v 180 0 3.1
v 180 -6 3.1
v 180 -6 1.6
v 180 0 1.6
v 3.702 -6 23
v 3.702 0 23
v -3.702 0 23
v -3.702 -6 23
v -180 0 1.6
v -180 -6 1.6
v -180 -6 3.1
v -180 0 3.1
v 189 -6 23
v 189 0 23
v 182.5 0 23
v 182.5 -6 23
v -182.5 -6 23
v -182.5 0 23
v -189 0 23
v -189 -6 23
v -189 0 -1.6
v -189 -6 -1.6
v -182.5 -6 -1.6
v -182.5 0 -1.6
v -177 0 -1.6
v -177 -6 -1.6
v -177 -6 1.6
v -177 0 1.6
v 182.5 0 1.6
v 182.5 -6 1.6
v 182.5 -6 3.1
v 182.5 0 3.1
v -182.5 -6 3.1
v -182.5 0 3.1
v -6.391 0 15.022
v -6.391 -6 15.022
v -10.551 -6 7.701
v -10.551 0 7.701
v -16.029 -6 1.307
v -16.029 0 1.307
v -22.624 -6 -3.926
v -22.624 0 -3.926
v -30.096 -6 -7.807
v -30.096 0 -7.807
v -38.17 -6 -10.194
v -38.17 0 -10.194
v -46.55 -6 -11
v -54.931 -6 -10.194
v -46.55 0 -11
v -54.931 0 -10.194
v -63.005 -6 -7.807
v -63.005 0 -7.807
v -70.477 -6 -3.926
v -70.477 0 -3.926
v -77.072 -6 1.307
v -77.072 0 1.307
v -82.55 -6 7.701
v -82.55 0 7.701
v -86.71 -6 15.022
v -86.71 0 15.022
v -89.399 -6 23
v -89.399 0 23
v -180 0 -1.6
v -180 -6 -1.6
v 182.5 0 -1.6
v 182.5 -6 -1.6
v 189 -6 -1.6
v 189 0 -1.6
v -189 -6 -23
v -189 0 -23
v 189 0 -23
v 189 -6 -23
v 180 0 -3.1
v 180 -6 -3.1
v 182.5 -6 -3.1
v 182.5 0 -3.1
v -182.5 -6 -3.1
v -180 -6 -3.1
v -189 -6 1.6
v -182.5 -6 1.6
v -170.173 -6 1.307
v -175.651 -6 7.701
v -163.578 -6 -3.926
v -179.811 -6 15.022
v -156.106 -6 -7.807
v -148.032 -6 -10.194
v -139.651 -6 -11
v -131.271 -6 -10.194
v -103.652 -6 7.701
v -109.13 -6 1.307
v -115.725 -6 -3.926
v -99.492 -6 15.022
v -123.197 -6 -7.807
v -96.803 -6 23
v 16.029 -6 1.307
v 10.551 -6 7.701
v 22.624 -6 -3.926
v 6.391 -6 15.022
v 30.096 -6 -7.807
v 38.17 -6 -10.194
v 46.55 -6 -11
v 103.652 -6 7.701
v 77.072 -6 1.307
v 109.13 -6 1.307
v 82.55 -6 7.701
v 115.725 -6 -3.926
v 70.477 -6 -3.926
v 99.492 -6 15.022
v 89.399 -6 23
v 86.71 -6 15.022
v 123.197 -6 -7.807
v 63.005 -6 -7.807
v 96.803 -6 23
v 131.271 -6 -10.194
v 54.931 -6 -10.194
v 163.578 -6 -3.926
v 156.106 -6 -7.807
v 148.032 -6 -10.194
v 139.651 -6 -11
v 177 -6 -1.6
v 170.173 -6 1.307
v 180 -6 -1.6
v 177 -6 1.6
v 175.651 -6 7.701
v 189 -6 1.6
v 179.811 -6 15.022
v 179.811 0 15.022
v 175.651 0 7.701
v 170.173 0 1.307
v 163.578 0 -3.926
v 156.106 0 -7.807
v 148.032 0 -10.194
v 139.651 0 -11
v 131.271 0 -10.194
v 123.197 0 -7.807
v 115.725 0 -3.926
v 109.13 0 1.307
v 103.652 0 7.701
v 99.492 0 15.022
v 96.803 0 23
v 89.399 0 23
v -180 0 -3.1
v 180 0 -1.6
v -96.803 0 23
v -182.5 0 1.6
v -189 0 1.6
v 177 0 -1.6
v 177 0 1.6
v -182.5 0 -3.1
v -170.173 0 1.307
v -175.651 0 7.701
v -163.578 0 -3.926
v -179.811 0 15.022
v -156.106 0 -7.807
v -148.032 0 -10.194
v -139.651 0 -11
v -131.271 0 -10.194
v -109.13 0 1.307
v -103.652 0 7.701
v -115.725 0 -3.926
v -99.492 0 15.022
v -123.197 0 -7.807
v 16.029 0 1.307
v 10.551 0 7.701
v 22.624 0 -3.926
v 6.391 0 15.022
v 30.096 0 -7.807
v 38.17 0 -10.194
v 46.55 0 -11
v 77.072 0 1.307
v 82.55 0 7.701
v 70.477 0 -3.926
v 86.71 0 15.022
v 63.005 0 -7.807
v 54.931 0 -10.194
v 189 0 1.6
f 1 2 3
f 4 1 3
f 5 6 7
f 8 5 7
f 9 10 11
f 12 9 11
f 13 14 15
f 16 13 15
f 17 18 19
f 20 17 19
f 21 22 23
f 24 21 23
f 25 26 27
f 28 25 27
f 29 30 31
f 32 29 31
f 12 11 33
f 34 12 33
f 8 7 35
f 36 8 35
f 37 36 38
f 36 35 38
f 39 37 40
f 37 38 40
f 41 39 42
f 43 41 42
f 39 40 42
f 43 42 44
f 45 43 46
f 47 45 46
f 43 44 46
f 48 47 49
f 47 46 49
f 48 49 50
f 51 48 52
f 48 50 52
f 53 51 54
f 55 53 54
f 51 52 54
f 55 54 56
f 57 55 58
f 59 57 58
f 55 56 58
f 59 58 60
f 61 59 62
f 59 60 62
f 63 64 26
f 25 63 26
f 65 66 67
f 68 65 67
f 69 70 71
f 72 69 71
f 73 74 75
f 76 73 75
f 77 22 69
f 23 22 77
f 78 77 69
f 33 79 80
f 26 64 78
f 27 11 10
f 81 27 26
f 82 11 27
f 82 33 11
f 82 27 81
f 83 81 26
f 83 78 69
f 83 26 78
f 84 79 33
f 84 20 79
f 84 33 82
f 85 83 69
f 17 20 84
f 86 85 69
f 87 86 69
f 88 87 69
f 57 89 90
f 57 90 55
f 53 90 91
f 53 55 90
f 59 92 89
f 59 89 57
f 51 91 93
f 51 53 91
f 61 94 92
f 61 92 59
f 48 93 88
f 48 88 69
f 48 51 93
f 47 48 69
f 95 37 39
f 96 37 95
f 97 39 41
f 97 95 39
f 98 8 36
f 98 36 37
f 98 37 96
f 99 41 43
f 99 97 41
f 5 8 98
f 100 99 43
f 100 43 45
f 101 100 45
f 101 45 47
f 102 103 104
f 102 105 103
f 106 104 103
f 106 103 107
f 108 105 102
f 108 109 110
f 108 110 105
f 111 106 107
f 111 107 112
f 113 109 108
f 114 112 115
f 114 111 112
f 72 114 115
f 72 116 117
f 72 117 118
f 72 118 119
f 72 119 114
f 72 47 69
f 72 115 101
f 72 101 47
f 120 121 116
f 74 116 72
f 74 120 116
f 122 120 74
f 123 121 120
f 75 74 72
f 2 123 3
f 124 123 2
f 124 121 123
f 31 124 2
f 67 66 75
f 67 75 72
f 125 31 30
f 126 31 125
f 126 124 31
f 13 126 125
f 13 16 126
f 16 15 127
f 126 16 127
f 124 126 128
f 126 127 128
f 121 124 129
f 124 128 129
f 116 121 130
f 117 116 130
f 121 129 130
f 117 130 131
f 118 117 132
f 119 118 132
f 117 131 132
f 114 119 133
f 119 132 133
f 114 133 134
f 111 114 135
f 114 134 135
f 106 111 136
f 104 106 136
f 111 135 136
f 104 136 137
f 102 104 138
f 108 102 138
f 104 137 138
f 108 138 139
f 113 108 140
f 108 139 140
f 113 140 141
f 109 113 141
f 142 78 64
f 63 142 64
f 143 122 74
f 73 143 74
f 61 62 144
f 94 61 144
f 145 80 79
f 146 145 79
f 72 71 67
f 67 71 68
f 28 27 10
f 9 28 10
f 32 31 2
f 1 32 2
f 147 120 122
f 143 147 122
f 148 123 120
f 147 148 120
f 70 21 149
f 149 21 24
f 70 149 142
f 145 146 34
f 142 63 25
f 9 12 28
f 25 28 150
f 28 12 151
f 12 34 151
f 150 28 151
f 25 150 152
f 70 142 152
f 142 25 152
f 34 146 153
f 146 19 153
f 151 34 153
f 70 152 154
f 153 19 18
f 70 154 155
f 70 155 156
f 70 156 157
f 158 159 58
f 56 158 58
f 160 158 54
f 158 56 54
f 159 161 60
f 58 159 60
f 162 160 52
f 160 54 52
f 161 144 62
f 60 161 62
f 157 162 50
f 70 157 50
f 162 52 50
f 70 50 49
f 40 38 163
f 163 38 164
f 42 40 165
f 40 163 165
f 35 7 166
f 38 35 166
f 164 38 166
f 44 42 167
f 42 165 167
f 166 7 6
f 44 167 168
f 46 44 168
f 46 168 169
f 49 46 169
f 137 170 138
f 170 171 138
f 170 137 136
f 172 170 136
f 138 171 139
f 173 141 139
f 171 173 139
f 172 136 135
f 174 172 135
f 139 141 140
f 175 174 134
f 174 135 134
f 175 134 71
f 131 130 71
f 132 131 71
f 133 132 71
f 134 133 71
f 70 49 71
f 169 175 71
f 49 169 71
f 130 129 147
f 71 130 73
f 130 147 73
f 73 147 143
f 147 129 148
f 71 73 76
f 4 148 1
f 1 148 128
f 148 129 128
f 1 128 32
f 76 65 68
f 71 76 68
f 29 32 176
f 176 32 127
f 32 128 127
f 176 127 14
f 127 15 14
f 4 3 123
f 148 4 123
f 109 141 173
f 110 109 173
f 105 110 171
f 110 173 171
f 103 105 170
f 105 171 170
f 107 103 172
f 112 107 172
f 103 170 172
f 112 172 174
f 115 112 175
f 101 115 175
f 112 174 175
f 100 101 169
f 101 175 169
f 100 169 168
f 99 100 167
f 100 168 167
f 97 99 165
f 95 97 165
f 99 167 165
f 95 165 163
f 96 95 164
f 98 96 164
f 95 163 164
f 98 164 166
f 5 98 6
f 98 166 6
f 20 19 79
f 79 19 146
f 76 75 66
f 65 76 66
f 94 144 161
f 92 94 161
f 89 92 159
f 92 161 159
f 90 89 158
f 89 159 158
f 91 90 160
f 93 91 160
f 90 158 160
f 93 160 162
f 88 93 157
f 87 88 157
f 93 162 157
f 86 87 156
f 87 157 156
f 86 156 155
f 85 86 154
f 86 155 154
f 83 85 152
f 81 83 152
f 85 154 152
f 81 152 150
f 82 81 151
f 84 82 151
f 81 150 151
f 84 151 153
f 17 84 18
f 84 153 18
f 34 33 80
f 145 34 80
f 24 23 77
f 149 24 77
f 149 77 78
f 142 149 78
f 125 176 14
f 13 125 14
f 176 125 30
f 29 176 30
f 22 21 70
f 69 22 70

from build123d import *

# Parameters (mm, degrees)
F1_DEPTH = 6
F3_DEPTH = 6.001


with BuildPart() as f1:
    # F0 (on Front) → F1 (new body)
    with BuildSketch(Plane.XZ):
        with BuildLine():
            Line((-182.5, 23), (-189, 23))
            Line((-189, 23), (-189, -23))
            Line((-189, -23), (189, -23))
            Line((189, -23), (189, 23))
            Line((189, 23), (182.5, 23))
            ThreePointArc((182.5, 23), (139.651429, -11), (96.802859, 23))
            Line((96.802859, 23), (89.399047, 23))
            ThreePointArc((89.399047, 23), (46.550476, -11), (3.701906, 23))
            Line((3.701906, 23), (-3.701906, 23))
            ThreePointArc((-3.701906, 23), (-46.550476, -11), (-89.399047, 23))
            Line((-89.399047, 23), (-96.802859, 23))
            ThreePointArc((-96.802859, 23), (-139.651429, -11), (-182.5, 23))
        make_face()
    extrude(amount=F1_DEPTH)

    # F2 (on face) → F3 (cut, through all)
    with BuildSketch(Plane.XZ.offset(6)):
        Polygon((189, -1.6), (189, 1.6), (182.5, 1.6), (182.5, 3.1), (180, 3.1), (180, 1.6), (177, 1.6), (177, -1.6), (180, -1.6), (180, -3.1), (182.5, -3.1), (182.5, -1.6), align=None)
        Polygon((-177, -1.6), (-177, 1.6), (-180, 1.6), (-180, 3.1), (-182.5, 3.1), (-182.5, 1.6), (-189, 1.6), (-189, -1.6), (-182.5, -1.6), (-182.5, -3.1), (-180, -3.1), (-180, -1.6), align=None)
    extrude(amount=-F3_DEPTH, mode=Mode.SUBTRACT)


solid = f1.part
